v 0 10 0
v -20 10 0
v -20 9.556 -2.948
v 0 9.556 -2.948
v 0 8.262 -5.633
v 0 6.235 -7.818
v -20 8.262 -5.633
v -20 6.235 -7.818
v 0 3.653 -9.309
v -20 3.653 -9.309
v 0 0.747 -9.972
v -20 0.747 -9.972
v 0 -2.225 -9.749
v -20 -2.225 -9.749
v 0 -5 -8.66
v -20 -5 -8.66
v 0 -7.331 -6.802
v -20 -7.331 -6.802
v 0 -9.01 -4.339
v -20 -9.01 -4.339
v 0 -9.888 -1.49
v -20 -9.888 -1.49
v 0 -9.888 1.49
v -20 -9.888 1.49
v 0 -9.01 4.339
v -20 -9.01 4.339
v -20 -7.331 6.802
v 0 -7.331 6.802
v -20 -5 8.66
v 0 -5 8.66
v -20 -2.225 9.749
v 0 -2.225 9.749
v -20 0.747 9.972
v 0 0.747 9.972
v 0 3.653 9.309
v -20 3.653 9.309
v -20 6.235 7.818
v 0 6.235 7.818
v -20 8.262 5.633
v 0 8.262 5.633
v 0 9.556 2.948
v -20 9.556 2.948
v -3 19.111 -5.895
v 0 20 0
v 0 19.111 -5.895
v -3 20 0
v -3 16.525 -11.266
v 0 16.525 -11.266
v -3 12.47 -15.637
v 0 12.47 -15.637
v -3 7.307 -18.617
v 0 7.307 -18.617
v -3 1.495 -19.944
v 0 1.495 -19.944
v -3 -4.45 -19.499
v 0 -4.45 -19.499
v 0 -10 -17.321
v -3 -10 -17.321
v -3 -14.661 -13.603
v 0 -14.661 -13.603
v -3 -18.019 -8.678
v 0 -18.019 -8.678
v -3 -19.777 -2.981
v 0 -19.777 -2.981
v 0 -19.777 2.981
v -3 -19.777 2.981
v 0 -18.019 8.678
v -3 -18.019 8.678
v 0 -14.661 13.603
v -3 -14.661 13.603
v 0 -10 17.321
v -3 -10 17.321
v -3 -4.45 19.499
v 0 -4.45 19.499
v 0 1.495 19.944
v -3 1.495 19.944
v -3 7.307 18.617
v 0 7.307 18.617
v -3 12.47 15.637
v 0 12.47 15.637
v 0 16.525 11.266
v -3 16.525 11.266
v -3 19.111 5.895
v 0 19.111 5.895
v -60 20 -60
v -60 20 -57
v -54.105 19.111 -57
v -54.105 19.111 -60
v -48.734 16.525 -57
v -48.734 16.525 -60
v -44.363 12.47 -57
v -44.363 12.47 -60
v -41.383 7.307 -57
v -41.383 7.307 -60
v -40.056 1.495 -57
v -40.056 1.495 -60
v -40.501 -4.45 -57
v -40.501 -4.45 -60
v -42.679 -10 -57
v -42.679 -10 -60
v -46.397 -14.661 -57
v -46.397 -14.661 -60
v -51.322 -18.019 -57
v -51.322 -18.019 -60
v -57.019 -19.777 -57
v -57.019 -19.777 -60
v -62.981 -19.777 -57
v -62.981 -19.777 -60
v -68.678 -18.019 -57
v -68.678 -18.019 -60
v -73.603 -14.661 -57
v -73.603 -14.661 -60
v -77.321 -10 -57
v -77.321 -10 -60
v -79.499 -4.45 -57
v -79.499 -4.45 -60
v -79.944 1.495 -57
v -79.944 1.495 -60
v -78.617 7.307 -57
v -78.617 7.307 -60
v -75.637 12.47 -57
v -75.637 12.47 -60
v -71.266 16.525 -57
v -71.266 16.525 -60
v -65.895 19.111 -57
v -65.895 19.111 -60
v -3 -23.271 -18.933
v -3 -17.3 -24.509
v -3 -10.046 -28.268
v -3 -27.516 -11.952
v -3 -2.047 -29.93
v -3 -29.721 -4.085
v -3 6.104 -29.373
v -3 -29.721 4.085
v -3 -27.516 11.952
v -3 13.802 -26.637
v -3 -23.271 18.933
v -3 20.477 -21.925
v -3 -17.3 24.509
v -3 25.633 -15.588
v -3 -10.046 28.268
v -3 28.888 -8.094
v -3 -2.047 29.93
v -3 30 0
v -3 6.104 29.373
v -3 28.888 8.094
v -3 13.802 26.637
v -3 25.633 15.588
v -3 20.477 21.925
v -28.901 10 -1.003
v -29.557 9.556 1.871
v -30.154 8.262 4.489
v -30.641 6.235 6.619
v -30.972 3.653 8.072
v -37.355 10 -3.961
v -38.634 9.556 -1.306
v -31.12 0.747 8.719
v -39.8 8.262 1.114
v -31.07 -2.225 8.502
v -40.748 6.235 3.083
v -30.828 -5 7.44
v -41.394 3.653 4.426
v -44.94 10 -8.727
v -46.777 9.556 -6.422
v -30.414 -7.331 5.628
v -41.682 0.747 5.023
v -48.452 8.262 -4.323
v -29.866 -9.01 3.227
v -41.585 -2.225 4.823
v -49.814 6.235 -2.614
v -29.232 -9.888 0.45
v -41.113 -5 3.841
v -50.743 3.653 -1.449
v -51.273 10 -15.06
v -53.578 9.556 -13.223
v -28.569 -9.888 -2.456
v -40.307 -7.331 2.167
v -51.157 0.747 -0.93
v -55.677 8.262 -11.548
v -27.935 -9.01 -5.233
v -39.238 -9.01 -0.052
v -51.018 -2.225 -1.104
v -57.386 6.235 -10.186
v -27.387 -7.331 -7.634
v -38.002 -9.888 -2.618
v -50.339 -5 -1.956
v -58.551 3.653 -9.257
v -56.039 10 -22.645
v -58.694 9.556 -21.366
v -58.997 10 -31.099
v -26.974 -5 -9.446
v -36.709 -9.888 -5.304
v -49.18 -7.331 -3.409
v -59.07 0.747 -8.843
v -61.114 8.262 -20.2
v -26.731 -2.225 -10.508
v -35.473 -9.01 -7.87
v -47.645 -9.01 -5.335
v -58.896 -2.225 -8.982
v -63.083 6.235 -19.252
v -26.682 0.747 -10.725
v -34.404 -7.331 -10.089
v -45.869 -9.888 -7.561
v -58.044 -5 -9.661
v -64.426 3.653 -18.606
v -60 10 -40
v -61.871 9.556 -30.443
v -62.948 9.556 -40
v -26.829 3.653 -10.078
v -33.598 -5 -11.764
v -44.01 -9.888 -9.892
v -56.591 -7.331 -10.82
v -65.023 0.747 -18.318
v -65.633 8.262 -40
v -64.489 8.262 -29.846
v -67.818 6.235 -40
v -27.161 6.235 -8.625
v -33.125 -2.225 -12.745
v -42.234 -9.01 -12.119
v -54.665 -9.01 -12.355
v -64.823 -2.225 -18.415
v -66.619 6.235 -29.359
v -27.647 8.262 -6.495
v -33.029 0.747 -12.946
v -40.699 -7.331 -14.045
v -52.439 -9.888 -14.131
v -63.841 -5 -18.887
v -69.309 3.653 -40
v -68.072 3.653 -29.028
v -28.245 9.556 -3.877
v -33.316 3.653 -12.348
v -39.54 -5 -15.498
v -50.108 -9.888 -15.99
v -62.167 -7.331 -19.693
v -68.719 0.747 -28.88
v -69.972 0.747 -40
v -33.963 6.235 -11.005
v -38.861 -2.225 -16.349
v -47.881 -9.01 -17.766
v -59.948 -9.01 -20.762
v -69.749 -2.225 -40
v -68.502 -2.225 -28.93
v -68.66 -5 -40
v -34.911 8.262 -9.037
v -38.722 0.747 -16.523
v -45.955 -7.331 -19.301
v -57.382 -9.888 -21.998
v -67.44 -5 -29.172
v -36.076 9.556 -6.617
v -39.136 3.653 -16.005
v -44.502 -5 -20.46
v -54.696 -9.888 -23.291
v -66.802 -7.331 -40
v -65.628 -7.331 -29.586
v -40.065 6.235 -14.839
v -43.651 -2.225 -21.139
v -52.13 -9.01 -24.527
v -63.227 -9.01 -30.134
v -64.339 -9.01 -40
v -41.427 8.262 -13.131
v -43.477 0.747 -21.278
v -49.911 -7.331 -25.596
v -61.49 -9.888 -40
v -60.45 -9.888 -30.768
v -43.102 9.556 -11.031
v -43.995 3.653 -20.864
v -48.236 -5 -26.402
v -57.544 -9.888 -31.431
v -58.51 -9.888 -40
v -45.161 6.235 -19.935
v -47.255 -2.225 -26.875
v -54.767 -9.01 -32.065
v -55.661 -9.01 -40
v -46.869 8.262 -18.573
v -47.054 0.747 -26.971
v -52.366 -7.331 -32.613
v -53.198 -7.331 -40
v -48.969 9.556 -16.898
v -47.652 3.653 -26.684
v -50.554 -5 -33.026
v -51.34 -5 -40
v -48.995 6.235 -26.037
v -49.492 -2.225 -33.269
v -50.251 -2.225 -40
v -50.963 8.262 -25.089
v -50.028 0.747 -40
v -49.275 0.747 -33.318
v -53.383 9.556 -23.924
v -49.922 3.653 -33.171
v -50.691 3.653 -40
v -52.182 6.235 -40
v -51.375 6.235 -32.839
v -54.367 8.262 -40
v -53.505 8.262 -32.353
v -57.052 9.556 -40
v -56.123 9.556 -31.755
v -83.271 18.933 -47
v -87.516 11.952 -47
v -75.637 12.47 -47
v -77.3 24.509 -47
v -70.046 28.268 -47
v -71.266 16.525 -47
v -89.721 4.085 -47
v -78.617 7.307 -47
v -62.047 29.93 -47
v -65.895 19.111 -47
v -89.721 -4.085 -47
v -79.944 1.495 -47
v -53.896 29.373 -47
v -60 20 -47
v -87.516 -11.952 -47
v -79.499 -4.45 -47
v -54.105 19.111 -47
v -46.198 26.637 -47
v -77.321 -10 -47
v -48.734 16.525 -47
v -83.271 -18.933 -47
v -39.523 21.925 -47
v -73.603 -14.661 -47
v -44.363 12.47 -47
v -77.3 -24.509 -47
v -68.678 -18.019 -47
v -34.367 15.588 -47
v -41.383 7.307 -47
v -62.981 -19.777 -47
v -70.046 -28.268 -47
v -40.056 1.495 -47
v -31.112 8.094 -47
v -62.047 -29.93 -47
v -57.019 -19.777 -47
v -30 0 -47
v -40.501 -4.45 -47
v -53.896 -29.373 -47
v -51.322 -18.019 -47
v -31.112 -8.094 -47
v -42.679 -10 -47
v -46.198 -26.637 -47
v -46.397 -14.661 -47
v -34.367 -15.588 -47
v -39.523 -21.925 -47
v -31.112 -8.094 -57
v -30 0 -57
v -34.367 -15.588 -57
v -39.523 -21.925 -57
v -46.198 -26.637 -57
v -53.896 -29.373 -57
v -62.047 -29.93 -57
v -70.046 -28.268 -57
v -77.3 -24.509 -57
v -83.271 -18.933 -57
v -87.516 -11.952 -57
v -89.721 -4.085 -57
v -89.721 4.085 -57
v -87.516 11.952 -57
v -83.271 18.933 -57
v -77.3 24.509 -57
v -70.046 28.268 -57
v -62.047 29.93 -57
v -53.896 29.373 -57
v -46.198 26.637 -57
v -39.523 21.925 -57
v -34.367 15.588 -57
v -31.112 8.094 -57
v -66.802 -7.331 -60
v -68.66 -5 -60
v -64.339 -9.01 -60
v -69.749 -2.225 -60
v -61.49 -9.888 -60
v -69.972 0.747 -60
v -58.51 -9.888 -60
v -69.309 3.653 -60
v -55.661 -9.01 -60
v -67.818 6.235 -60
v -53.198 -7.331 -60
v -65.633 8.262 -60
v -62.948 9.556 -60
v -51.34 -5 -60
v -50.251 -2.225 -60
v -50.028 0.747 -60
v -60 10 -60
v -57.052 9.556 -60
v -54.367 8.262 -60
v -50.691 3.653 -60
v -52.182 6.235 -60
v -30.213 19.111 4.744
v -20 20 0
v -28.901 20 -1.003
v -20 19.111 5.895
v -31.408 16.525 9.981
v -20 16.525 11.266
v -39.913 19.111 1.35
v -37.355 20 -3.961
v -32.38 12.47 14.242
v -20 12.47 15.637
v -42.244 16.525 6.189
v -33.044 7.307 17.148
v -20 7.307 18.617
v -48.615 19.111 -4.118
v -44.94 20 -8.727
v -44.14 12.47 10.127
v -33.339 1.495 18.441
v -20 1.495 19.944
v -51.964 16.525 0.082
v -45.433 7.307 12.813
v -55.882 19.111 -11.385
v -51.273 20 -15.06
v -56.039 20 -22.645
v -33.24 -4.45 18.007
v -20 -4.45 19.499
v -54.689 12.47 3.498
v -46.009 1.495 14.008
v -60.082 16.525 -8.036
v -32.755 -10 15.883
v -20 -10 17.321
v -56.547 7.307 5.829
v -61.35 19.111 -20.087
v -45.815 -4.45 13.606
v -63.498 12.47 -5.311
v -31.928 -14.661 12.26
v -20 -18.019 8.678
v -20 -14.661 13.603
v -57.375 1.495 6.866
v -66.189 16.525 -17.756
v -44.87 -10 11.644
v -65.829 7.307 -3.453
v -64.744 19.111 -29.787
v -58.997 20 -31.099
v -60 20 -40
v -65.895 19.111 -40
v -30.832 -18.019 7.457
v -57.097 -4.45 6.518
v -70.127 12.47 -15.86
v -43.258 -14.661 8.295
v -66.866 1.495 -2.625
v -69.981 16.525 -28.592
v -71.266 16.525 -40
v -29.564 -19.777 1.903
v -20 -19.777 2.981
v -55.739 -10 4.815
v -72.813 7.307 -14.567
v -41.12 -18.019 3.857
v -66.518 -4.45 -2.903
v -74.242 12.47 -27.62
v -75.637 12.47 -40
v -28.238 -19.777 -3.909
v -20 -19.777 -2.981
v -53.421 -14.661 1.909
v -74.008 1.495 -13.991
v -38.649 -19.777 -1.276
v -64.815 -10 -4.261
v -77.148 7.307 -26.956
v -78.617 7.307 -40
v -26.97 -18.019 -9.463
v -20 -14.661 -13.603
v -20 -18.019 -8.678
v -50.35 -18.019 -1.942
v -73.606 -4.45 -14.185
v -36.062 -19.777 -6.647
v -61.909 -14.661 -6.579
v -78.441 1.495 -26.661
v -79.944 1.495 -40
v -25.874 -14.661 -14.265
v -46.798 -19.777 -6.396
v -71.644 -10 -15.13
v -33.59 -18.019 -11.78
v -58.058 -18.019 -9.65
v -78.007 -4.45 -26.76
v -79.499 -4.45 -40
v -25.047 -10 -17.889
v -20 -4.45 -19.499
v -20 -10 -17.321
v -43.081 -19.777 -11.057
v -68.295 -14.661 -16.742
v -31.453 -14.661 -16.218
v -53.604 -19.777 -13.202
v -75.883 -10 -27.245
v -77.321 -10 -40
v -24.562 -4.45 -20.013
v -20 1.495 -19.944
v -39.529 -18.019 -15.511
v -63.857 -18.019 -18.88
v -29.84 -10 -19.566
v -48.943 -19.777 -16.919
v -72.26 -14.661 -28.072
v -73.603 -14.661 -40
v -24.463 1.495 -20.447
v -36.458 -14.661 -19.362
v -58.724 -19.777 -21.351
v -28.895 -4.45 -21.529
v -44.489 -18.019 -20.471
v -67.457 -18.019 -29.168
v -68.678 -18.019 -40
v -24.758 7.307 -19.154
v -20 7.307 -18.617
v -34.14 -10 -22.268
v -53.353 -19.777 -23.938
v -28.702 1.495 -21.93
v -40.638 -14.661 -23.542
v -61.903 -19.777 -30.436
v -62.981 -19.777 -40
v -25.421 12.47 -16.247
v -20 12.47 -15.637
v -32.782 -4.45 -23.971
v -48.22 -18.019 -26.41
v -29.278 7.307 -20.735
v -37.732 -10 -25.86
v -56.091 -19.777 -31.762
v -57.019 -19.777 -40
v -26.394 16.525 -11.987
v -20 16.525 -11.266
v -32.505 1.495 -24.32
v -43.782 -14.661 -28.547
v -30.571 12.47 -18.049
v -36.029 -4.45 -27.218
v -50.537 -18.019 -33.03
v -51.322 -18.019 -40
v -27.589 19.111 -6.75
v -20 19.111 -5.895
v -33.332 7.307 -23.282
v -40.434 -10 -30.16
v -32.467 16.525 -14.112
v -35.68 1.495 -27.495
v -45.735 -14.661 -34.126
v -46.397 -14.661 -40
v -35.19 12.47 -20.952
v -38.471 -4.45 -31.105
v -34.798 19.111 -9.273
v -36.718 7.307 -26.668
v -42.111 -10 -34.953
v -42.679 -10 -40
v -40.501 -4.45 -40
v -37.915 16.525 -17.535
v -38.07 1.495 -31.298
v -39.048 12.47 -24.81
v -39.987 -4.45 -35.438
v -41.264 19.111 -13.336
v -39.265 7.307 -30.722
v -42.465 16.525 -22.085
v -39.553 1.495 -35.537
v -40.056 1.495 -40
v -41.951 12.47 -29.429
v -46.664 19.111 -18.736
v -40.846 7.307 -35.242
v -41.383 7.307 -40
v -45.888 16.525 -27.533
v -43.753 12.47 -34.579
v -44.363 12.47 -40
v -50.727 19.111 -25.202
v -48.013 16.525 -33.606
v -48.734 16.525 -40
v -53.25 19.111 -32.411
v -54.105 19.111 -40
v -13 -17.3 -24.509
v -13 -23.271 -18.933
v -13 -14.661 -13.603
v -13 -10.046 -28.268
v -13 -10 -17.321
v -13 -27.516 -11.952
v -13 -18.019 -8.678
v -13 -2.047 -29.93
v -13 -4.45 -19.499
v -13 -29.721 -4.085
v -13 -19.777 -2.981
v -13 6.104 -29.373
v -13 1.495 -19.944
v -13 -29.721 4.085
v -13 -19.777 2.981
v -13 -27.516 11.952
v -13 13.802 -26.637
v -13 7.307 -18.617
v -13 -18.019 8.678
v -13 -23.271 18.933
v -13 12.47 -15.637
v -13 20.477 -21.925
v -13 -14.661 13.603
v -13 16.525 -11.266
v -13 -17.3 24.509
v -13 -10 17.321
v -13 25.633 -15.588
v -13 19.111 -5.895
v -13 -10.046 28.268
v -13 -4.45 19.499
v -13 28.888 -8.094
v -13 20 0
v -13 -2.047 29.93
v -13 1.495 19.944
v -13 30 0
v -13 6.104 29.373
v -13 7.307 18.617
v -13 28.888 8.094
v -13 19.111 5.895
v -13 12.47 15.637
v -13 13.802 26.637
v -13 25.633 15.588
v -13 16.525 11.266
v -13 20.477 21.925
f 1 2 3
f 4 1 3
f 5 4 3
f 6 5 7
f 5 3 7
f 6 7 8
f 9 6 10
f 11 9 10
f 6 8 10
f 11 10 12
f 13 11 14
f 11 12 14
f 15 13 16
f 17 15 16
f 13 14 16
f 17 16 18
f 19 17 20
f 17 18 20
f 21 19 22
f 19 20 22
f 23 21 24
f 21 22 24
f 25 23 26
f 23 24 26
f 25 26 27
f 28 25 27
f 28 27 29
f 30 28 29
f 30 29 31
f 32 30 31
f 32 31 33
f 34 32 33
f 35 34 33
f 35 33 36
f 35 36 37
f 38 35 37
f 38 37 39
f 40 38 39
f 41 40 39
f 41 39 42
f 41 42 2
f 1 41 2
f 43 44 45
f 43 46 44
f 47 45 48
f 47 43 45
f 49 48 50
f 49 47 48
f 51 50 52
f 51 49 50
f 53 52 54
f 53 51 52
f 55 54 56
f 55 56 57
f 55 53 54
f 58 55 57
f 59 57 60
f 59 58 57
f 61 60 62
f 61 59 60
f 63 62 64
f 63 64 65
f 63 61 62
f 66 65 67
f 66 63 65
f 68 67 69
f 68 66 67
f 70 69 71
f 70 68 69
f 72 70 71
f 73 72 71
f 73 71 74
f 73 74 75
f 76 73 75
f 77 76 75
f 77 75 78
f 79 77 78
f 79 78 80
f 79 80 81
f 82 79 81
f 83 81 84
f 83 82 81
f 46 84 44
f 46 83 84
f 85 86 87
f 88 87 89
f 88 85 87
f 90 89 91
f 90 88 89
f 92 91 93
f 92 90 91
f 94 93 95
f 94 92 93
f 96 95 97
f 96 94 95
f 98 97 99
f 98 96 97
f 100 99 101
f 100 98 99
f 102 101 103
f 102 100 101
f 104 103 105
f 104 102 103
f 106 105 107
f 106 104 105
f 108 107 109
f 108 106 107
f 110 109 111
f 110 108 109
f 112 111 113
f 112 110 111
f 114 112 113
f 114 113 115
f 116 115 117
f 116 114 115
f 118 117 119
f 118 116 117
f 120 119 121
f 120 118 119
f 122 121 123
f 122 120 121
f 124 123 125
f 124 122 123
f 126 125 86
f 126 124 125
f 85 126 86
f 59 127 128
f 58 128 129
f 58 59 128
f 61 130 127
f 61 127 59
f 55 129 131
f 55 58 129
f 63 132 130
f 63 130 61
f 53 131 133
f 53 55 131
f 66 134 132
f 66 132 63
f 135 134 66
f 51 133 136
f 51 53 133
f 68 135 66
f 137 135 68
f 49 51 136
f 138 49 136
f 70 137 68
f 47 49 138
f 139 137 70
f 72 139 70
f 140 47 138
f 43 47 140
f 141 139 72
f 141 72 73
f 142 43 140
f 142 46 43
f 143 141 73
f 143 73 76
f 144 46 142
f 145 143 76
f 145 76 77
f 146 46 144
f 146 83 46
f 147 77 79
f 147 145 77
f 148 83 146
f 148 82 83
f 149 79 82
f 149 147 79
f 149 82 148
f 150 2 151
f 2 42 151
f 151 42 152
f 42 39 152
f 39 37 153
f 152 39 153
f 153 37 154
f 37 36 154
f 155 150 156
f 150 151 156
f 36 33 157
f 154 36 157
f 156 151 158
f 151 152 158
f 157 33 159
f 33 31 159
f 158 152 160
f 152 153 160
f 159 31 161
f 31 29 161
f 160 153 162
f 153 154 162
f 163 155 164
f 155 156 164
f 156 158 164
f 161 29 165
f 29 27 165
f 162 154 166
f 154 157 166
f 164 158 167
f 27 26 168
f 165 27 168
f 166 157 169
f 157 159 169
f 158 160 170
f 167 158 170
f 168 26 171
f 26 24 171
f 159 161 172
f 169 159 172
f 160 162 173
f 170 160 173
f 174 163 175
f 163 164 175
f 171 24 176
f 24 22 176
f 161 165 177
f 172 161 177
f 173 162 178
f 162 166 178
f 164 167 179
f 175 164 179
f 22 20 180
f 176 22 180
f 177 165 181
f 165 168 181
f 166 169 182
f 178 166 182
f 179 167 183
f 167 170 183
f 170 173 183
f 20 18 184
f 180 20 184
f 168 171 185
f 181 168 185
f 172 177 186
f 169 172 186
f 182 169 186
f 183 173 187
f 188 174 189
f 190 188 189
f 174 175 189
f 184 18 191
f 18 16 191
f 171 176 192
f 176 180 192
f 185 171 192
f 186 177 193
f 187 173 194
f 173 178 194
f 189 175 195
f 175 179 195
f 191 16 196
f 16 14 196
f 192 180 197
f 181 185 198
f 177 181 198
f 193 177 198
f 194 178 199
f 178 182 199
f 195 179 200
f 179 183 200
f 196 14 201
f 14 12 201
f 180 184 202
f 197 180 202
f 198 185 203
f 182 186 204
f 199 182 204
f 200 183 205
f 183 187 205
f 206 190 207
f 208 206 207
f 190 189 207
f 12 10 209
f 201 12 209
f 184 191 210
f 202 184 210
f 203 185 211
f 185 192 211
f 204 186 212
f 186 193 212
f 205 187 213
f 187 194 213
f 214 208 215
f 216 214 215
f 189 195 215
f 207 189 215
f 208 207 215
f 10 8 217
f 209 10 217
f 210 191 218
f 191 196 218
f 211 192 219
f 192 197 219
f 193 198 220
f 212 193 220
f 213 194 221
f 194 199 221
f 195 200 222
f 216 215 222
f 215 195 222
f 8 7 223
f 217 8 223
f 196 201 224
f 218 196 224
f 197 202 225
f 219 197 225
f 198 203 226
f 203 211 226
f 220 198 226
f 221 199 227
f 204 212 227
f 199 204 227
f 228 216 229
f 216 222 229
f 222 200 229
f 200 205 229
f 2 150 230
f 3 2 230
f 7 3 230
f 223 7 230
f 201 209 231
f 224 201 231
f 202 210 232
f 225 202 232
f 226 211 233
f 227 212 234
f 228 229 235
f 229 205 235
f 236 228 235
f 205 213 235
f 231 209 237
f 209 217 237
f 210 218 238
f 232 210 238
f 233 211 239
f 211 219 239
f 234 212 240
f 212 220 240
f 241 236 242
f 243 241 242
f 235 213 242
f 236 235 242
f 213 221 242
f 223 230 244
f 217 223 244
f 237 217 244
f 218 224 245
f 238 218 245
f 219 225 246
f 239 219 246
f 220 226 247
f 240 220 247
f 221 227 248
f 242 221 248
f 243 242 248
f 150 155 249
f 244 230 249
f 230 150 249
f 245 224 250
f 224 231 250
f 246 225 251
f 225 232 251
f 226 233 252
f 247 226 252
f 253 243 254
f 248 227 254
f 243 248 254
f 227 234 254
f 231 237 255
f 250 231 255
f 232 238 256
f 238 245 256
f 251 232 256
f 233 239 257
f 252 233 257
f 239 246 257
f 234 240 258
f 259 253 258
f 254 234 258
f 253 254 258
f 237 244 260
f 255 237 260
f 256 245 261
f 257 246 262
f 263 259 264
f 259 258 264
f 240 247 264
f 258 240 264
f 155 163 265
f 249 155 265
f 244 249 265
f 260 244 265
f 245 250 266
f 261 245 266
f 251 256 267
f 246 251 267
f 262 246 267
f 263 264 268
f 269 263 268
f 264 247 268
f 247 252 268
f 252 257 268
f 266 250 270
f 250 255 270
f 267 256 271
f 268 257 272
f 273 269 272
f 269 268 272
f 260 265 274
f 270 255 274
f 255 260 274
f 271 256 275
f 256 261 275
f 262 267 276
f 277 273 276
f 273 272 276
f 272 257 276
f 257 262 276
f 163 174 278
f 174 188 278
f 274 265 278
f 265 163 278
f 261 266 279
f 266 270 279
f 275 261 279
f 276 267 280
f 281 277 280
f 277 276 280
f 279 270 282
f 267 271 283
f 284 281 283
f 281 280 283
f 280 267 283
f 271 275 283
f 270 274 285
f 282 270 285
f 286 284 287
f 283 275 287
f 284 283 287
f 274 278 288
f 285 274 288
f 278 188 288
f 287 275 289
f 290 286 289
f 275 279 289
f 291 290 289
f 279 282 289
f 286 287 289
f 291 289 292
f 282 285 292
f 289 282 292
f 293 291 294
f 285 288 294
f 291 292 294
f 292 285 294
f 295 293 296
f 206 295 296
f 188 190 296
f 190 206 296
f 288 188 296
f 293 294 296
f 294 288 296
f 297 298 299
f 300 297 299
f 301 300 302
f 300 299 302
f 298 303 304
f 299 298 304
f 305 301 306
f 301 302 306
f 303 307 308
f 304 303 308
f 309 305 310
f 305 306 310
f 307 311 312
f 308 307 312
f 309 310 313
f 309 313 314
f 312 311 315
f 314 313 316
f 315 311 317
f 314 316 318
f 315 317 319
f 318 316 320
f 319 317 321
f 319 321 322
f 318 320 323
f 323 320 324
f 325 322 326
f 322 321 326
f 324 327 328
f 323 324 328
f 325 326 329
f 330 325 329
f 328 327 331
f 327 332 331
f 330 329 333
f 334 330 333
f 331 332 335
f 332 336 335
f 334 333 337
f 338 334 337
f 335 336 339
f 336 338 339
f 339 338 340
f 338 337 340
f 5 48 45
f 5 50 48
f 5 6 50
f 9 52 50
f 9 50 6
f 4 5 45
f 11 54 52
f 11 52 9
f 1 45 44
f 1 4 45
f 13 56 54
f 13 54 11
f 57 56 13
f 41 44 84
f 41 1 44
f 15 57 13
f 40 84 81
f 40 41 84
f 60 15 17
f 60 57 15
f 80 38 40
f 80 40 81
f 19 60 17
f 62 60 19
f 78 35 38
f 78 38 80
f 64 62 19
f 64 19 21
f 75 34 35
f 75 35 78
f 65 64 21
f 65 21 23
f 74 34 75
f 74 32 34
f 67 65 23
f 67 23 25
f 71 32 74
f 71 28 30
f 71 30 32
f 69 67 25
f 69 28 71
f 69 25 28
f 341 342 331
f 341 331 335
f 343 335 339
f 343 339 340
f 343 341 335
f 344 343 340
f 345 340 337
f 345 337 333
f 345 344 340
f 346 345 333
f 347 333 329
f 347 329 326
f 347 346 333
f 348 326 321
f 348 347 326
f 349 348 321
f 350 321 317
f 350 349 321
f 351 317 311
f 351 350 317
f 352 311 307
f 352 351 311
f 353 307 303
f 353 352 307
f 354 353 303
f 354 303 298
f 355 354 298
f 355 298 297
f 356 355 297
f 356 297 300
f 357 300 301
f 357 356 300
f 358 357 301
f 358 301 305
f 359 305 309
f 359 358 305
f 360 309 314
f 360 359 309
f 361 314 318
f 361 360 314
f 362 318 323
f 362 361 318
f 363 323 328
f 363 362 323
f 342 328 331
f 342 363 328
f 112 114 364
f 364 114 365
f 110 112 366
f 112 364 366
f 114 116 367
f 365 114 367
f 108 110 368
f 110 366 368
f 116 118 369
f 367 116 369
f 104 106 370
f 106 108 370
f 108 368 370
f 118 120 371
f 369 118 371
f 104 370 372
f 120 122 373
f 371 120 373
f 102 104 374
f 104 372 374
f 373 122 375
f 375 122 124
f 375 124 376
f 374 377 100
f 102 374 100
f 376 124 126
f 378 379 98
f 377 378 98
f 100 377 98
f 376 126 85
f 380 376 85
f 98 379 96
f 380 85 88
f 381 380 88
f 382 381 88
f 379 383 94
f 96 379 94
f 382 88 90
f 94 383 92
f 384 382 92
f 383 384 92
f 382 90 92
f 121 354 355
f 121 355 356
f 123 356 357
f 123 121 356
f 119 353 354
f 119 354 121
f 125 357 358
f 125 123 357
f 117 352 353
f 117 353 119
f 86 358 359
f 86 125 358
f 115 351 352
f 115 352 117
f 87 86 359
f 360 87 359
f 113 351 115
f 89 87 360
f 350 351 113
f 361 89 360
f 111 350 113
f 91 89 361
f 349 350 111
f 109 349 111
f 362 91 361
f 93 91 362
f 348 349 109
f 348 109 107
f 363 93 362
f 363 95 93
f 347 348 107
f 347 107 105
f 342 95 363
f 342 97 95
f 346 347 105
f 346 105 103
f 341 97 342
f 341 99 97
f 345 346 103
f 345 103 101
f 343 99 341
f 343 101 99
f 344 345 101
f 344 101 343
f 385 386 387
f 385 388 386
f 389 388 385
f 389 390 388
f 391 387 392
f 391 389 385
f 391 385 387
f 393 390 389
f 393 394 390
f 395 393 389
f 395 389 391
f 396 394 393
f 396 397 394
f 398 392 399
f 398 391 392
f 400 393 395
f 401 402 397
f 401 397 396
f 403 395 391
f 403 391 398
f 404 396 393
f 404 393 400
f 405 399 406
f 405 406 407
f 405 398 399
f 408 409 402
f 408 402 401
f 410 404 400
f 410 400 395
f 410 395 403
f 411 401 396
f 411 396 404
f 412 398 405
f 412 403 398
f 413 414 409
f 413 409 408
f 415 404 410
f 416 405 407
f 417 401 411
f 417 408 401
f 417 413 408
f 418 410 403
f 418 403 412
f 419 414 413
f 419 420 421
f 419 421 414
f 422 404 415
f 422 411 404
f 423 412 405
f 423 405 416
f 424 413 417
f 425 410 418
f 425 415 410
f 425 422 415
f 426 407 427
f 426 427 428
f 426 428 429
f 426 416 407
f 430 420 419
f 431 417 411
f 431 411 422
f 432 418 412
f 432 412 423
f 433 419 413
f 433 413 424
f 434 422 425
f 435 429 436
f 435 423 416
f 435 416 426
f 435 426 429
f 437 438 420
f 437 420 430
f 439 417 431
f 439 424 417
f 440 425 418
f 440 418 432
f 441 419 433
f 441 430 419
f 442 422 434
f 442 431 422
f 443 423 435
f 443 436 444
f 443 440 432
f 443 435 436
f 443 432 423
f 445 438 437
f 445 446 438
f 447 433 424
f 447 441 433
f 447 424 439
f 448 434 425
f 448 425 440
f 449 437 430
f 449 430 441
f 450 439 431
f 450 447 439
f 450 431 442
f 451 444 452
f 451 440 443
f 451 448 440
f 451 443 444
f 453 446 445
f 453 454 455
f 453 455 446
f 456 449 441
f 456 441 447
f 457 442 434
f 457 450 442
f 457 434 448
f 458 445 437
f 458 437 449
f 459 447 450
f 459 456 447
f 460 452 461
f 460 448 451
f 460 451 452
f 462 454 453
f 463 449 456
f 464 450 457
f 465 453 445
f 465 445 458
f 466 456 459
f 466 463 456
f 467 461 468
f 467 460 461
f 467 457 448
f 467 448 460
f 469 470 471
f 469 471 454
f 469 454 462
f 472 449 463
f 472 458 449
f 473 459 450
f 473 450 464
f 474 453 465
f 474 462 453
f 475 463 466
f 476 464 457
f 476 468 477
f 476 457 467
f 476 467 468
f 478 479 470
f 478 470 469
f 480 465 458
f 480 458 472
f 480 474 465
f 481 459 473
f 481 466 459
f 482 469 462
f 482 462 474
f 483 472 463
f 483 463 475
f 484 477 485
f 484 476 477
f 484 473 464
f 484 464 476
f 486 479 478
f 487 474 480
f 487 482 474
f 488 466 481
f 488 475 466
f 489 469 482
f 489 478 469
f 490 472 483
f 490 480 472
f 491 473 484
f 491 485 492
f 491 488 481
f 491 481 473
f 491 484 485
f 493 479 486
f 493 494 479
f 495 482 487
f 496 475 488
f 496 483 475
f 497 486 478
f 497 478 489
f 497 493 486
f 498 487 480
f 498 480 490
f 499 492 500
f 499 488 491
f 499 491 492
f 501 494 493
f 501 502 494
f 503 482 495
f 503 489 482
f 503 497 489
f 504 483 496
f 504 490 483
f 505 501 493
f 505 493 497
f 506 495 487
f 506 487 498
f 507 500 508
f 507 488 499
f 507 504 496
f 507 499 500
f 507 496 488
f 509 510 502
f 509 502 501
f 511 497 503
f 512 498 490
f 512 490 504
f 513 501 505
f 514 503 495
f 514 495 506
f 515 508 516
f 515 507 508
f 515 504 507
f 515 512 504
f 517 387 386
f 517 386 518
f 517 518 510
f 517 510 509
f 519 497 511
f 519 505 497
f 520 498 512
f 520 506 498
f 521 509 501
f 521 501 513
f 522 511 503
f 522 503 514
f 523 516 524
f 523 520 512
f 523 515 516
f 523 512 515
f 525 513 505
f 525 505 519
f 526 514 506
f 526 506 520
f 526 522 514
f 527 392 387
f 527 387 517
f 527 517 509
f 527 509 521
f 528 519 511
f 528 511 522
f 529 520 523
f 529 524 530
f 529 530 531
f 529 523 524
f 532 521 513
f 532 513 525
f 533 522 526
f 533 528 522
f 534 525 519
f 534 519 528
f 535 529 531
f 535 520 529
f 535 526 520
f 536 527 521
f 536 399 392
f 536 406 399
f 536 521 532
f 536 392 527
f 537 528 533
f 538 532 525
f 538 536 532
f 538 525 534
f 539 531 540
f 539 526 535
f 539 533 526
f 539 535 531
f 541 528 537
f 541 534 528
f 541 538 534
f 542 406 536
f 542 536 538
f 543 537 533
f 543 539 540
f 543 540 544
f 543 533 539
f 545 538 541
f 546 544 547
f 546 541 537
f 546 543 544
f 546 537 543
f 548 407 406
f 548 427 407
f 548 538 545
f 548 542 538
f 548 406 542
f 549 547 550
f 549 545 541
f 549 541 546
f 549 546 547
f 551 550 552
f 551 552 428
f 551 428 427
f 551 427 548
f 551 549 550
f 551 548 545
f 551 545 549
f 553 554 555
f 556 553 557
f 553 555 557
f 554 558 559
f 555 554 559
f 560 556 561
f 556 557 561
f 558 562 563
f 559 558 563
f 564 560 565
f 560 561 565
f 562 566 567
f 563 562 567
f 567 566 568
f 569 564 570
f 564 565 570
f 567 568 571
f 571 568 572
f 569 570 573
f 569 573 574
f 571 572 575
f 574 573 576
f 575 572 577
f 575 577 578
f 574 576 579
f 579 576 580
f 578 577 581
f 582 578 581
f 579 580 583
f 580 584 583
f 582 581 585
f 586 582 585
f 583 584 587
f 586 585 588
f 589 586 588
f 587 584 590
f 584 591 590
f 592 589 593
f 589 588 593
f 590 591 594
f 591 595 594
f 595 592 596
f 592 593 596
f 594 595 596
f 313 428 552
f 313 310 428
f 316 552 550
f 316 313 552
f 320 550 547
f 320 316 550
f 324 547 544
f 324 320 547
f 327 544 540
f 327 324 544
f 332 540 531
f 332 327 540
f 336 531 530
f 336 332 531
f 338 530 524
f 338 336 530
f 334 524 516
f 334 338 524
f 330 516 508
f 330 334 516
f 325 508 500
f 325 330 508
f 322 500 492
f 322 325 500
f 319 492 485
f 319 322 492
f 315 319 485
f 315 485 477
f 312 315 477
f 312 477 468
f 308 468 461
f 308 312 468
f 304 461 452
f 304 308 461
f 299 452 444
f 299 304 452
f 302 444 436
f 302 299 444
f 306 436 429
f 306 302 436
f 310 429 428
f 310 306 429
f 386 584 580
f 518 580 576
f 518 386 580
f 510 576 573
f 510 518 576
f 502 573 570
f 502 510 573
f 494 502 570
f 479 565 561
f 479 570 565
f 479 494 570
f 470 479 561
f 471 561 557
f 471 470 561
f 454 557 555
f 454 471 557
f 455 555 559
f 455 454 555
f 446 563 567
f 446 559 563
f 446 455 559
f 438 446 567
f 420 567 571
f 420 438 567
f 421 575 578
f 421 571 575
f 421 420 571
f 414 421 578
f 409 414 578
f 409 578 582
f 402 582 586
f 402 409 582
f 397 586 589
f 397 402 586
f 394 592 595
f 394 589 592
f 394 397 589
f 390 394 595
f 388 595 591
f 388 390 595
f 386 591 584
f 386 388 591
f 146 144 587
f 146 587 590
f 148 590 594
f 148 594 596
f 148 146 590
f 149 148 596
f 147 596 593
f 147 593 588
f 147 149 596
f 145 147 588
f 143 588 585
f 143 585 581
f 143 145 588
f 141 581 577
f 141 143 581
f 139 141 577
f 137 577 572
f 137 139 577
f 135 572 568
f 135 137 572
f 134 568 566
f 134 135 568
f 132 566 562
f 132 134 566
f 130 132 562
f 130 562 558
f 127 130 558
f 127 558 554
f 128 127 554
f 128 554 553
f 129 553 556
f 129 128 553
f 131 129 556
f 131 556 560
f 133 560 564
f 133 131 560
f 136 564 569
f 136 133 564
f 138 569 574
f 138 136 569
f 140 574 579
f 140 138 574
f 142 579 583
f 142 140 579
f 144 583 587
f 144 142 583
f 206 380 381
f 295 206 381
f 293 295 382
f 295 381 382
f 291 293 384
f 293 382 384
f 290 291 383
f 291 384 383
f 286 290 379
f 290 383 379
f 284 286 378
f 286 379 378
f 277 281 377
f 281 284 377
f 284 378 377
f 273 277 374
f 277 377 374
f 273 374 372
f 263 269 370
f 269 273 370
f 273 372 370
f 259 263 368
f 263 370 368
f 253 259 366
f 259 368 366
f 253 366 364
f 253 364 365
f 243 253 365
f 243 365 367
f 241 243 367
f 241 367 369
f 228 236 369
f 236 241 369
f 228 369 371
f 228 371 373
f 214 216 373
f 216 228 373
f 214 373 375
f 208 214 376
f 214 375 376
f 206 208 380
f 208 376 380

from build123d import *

# Parameters (mm, degrees)
F0_R     = 20
F0_R_2   = 10
F4_R     = 30
F4_R_2   = 20
F5_DEPTH = 10
F7_R     = 30
F7_R_2   = 20
F8_DEPTH = 10


with BuildPart() as f2:
    # F2: sweep along a path in F1
    with BuildLine(Plane.XZ) as f2_path:
        Line((0, 0), (-20, 0))
        ThreePointArc((-20, 0), (-48.2842712475, -11.7157287525), (-60, -40))
        Line((-60, -40), (-60, -60))
    # F0 (on Right) → F2 (sweep)
    with BuildSketch(Plane.YZ):
        Circle(F0_R)
        Circle(F0_R_2, mode=Mode.SUBTRACT)
    sweep(path=f2_path.line)

    # F4 (on offset) → F5 (join)
    with BuildSketch(Plane.YZ.offset(-3)):
        Circle(F4_R)
        Circle(F4_R_2, mode=Mode.SUBTRACT)
    extrude(amount=-F5_DEPTH)

    # F7 (on offset) → F8 (join)
    with BuildSketch(Plane(origin=(0, 0, -57), x_dir=(1, 0, 0), z_dir=(0, 0, -1))):
        with Locations((-60, 0)):
            Circle(F7_R)
        with Locations((-60, 0)):
            Circle(F7_R_2, mode=Mode.SUBTRACT)
    extrude(amount=-F8_DEPTH)


solid = f2.part
